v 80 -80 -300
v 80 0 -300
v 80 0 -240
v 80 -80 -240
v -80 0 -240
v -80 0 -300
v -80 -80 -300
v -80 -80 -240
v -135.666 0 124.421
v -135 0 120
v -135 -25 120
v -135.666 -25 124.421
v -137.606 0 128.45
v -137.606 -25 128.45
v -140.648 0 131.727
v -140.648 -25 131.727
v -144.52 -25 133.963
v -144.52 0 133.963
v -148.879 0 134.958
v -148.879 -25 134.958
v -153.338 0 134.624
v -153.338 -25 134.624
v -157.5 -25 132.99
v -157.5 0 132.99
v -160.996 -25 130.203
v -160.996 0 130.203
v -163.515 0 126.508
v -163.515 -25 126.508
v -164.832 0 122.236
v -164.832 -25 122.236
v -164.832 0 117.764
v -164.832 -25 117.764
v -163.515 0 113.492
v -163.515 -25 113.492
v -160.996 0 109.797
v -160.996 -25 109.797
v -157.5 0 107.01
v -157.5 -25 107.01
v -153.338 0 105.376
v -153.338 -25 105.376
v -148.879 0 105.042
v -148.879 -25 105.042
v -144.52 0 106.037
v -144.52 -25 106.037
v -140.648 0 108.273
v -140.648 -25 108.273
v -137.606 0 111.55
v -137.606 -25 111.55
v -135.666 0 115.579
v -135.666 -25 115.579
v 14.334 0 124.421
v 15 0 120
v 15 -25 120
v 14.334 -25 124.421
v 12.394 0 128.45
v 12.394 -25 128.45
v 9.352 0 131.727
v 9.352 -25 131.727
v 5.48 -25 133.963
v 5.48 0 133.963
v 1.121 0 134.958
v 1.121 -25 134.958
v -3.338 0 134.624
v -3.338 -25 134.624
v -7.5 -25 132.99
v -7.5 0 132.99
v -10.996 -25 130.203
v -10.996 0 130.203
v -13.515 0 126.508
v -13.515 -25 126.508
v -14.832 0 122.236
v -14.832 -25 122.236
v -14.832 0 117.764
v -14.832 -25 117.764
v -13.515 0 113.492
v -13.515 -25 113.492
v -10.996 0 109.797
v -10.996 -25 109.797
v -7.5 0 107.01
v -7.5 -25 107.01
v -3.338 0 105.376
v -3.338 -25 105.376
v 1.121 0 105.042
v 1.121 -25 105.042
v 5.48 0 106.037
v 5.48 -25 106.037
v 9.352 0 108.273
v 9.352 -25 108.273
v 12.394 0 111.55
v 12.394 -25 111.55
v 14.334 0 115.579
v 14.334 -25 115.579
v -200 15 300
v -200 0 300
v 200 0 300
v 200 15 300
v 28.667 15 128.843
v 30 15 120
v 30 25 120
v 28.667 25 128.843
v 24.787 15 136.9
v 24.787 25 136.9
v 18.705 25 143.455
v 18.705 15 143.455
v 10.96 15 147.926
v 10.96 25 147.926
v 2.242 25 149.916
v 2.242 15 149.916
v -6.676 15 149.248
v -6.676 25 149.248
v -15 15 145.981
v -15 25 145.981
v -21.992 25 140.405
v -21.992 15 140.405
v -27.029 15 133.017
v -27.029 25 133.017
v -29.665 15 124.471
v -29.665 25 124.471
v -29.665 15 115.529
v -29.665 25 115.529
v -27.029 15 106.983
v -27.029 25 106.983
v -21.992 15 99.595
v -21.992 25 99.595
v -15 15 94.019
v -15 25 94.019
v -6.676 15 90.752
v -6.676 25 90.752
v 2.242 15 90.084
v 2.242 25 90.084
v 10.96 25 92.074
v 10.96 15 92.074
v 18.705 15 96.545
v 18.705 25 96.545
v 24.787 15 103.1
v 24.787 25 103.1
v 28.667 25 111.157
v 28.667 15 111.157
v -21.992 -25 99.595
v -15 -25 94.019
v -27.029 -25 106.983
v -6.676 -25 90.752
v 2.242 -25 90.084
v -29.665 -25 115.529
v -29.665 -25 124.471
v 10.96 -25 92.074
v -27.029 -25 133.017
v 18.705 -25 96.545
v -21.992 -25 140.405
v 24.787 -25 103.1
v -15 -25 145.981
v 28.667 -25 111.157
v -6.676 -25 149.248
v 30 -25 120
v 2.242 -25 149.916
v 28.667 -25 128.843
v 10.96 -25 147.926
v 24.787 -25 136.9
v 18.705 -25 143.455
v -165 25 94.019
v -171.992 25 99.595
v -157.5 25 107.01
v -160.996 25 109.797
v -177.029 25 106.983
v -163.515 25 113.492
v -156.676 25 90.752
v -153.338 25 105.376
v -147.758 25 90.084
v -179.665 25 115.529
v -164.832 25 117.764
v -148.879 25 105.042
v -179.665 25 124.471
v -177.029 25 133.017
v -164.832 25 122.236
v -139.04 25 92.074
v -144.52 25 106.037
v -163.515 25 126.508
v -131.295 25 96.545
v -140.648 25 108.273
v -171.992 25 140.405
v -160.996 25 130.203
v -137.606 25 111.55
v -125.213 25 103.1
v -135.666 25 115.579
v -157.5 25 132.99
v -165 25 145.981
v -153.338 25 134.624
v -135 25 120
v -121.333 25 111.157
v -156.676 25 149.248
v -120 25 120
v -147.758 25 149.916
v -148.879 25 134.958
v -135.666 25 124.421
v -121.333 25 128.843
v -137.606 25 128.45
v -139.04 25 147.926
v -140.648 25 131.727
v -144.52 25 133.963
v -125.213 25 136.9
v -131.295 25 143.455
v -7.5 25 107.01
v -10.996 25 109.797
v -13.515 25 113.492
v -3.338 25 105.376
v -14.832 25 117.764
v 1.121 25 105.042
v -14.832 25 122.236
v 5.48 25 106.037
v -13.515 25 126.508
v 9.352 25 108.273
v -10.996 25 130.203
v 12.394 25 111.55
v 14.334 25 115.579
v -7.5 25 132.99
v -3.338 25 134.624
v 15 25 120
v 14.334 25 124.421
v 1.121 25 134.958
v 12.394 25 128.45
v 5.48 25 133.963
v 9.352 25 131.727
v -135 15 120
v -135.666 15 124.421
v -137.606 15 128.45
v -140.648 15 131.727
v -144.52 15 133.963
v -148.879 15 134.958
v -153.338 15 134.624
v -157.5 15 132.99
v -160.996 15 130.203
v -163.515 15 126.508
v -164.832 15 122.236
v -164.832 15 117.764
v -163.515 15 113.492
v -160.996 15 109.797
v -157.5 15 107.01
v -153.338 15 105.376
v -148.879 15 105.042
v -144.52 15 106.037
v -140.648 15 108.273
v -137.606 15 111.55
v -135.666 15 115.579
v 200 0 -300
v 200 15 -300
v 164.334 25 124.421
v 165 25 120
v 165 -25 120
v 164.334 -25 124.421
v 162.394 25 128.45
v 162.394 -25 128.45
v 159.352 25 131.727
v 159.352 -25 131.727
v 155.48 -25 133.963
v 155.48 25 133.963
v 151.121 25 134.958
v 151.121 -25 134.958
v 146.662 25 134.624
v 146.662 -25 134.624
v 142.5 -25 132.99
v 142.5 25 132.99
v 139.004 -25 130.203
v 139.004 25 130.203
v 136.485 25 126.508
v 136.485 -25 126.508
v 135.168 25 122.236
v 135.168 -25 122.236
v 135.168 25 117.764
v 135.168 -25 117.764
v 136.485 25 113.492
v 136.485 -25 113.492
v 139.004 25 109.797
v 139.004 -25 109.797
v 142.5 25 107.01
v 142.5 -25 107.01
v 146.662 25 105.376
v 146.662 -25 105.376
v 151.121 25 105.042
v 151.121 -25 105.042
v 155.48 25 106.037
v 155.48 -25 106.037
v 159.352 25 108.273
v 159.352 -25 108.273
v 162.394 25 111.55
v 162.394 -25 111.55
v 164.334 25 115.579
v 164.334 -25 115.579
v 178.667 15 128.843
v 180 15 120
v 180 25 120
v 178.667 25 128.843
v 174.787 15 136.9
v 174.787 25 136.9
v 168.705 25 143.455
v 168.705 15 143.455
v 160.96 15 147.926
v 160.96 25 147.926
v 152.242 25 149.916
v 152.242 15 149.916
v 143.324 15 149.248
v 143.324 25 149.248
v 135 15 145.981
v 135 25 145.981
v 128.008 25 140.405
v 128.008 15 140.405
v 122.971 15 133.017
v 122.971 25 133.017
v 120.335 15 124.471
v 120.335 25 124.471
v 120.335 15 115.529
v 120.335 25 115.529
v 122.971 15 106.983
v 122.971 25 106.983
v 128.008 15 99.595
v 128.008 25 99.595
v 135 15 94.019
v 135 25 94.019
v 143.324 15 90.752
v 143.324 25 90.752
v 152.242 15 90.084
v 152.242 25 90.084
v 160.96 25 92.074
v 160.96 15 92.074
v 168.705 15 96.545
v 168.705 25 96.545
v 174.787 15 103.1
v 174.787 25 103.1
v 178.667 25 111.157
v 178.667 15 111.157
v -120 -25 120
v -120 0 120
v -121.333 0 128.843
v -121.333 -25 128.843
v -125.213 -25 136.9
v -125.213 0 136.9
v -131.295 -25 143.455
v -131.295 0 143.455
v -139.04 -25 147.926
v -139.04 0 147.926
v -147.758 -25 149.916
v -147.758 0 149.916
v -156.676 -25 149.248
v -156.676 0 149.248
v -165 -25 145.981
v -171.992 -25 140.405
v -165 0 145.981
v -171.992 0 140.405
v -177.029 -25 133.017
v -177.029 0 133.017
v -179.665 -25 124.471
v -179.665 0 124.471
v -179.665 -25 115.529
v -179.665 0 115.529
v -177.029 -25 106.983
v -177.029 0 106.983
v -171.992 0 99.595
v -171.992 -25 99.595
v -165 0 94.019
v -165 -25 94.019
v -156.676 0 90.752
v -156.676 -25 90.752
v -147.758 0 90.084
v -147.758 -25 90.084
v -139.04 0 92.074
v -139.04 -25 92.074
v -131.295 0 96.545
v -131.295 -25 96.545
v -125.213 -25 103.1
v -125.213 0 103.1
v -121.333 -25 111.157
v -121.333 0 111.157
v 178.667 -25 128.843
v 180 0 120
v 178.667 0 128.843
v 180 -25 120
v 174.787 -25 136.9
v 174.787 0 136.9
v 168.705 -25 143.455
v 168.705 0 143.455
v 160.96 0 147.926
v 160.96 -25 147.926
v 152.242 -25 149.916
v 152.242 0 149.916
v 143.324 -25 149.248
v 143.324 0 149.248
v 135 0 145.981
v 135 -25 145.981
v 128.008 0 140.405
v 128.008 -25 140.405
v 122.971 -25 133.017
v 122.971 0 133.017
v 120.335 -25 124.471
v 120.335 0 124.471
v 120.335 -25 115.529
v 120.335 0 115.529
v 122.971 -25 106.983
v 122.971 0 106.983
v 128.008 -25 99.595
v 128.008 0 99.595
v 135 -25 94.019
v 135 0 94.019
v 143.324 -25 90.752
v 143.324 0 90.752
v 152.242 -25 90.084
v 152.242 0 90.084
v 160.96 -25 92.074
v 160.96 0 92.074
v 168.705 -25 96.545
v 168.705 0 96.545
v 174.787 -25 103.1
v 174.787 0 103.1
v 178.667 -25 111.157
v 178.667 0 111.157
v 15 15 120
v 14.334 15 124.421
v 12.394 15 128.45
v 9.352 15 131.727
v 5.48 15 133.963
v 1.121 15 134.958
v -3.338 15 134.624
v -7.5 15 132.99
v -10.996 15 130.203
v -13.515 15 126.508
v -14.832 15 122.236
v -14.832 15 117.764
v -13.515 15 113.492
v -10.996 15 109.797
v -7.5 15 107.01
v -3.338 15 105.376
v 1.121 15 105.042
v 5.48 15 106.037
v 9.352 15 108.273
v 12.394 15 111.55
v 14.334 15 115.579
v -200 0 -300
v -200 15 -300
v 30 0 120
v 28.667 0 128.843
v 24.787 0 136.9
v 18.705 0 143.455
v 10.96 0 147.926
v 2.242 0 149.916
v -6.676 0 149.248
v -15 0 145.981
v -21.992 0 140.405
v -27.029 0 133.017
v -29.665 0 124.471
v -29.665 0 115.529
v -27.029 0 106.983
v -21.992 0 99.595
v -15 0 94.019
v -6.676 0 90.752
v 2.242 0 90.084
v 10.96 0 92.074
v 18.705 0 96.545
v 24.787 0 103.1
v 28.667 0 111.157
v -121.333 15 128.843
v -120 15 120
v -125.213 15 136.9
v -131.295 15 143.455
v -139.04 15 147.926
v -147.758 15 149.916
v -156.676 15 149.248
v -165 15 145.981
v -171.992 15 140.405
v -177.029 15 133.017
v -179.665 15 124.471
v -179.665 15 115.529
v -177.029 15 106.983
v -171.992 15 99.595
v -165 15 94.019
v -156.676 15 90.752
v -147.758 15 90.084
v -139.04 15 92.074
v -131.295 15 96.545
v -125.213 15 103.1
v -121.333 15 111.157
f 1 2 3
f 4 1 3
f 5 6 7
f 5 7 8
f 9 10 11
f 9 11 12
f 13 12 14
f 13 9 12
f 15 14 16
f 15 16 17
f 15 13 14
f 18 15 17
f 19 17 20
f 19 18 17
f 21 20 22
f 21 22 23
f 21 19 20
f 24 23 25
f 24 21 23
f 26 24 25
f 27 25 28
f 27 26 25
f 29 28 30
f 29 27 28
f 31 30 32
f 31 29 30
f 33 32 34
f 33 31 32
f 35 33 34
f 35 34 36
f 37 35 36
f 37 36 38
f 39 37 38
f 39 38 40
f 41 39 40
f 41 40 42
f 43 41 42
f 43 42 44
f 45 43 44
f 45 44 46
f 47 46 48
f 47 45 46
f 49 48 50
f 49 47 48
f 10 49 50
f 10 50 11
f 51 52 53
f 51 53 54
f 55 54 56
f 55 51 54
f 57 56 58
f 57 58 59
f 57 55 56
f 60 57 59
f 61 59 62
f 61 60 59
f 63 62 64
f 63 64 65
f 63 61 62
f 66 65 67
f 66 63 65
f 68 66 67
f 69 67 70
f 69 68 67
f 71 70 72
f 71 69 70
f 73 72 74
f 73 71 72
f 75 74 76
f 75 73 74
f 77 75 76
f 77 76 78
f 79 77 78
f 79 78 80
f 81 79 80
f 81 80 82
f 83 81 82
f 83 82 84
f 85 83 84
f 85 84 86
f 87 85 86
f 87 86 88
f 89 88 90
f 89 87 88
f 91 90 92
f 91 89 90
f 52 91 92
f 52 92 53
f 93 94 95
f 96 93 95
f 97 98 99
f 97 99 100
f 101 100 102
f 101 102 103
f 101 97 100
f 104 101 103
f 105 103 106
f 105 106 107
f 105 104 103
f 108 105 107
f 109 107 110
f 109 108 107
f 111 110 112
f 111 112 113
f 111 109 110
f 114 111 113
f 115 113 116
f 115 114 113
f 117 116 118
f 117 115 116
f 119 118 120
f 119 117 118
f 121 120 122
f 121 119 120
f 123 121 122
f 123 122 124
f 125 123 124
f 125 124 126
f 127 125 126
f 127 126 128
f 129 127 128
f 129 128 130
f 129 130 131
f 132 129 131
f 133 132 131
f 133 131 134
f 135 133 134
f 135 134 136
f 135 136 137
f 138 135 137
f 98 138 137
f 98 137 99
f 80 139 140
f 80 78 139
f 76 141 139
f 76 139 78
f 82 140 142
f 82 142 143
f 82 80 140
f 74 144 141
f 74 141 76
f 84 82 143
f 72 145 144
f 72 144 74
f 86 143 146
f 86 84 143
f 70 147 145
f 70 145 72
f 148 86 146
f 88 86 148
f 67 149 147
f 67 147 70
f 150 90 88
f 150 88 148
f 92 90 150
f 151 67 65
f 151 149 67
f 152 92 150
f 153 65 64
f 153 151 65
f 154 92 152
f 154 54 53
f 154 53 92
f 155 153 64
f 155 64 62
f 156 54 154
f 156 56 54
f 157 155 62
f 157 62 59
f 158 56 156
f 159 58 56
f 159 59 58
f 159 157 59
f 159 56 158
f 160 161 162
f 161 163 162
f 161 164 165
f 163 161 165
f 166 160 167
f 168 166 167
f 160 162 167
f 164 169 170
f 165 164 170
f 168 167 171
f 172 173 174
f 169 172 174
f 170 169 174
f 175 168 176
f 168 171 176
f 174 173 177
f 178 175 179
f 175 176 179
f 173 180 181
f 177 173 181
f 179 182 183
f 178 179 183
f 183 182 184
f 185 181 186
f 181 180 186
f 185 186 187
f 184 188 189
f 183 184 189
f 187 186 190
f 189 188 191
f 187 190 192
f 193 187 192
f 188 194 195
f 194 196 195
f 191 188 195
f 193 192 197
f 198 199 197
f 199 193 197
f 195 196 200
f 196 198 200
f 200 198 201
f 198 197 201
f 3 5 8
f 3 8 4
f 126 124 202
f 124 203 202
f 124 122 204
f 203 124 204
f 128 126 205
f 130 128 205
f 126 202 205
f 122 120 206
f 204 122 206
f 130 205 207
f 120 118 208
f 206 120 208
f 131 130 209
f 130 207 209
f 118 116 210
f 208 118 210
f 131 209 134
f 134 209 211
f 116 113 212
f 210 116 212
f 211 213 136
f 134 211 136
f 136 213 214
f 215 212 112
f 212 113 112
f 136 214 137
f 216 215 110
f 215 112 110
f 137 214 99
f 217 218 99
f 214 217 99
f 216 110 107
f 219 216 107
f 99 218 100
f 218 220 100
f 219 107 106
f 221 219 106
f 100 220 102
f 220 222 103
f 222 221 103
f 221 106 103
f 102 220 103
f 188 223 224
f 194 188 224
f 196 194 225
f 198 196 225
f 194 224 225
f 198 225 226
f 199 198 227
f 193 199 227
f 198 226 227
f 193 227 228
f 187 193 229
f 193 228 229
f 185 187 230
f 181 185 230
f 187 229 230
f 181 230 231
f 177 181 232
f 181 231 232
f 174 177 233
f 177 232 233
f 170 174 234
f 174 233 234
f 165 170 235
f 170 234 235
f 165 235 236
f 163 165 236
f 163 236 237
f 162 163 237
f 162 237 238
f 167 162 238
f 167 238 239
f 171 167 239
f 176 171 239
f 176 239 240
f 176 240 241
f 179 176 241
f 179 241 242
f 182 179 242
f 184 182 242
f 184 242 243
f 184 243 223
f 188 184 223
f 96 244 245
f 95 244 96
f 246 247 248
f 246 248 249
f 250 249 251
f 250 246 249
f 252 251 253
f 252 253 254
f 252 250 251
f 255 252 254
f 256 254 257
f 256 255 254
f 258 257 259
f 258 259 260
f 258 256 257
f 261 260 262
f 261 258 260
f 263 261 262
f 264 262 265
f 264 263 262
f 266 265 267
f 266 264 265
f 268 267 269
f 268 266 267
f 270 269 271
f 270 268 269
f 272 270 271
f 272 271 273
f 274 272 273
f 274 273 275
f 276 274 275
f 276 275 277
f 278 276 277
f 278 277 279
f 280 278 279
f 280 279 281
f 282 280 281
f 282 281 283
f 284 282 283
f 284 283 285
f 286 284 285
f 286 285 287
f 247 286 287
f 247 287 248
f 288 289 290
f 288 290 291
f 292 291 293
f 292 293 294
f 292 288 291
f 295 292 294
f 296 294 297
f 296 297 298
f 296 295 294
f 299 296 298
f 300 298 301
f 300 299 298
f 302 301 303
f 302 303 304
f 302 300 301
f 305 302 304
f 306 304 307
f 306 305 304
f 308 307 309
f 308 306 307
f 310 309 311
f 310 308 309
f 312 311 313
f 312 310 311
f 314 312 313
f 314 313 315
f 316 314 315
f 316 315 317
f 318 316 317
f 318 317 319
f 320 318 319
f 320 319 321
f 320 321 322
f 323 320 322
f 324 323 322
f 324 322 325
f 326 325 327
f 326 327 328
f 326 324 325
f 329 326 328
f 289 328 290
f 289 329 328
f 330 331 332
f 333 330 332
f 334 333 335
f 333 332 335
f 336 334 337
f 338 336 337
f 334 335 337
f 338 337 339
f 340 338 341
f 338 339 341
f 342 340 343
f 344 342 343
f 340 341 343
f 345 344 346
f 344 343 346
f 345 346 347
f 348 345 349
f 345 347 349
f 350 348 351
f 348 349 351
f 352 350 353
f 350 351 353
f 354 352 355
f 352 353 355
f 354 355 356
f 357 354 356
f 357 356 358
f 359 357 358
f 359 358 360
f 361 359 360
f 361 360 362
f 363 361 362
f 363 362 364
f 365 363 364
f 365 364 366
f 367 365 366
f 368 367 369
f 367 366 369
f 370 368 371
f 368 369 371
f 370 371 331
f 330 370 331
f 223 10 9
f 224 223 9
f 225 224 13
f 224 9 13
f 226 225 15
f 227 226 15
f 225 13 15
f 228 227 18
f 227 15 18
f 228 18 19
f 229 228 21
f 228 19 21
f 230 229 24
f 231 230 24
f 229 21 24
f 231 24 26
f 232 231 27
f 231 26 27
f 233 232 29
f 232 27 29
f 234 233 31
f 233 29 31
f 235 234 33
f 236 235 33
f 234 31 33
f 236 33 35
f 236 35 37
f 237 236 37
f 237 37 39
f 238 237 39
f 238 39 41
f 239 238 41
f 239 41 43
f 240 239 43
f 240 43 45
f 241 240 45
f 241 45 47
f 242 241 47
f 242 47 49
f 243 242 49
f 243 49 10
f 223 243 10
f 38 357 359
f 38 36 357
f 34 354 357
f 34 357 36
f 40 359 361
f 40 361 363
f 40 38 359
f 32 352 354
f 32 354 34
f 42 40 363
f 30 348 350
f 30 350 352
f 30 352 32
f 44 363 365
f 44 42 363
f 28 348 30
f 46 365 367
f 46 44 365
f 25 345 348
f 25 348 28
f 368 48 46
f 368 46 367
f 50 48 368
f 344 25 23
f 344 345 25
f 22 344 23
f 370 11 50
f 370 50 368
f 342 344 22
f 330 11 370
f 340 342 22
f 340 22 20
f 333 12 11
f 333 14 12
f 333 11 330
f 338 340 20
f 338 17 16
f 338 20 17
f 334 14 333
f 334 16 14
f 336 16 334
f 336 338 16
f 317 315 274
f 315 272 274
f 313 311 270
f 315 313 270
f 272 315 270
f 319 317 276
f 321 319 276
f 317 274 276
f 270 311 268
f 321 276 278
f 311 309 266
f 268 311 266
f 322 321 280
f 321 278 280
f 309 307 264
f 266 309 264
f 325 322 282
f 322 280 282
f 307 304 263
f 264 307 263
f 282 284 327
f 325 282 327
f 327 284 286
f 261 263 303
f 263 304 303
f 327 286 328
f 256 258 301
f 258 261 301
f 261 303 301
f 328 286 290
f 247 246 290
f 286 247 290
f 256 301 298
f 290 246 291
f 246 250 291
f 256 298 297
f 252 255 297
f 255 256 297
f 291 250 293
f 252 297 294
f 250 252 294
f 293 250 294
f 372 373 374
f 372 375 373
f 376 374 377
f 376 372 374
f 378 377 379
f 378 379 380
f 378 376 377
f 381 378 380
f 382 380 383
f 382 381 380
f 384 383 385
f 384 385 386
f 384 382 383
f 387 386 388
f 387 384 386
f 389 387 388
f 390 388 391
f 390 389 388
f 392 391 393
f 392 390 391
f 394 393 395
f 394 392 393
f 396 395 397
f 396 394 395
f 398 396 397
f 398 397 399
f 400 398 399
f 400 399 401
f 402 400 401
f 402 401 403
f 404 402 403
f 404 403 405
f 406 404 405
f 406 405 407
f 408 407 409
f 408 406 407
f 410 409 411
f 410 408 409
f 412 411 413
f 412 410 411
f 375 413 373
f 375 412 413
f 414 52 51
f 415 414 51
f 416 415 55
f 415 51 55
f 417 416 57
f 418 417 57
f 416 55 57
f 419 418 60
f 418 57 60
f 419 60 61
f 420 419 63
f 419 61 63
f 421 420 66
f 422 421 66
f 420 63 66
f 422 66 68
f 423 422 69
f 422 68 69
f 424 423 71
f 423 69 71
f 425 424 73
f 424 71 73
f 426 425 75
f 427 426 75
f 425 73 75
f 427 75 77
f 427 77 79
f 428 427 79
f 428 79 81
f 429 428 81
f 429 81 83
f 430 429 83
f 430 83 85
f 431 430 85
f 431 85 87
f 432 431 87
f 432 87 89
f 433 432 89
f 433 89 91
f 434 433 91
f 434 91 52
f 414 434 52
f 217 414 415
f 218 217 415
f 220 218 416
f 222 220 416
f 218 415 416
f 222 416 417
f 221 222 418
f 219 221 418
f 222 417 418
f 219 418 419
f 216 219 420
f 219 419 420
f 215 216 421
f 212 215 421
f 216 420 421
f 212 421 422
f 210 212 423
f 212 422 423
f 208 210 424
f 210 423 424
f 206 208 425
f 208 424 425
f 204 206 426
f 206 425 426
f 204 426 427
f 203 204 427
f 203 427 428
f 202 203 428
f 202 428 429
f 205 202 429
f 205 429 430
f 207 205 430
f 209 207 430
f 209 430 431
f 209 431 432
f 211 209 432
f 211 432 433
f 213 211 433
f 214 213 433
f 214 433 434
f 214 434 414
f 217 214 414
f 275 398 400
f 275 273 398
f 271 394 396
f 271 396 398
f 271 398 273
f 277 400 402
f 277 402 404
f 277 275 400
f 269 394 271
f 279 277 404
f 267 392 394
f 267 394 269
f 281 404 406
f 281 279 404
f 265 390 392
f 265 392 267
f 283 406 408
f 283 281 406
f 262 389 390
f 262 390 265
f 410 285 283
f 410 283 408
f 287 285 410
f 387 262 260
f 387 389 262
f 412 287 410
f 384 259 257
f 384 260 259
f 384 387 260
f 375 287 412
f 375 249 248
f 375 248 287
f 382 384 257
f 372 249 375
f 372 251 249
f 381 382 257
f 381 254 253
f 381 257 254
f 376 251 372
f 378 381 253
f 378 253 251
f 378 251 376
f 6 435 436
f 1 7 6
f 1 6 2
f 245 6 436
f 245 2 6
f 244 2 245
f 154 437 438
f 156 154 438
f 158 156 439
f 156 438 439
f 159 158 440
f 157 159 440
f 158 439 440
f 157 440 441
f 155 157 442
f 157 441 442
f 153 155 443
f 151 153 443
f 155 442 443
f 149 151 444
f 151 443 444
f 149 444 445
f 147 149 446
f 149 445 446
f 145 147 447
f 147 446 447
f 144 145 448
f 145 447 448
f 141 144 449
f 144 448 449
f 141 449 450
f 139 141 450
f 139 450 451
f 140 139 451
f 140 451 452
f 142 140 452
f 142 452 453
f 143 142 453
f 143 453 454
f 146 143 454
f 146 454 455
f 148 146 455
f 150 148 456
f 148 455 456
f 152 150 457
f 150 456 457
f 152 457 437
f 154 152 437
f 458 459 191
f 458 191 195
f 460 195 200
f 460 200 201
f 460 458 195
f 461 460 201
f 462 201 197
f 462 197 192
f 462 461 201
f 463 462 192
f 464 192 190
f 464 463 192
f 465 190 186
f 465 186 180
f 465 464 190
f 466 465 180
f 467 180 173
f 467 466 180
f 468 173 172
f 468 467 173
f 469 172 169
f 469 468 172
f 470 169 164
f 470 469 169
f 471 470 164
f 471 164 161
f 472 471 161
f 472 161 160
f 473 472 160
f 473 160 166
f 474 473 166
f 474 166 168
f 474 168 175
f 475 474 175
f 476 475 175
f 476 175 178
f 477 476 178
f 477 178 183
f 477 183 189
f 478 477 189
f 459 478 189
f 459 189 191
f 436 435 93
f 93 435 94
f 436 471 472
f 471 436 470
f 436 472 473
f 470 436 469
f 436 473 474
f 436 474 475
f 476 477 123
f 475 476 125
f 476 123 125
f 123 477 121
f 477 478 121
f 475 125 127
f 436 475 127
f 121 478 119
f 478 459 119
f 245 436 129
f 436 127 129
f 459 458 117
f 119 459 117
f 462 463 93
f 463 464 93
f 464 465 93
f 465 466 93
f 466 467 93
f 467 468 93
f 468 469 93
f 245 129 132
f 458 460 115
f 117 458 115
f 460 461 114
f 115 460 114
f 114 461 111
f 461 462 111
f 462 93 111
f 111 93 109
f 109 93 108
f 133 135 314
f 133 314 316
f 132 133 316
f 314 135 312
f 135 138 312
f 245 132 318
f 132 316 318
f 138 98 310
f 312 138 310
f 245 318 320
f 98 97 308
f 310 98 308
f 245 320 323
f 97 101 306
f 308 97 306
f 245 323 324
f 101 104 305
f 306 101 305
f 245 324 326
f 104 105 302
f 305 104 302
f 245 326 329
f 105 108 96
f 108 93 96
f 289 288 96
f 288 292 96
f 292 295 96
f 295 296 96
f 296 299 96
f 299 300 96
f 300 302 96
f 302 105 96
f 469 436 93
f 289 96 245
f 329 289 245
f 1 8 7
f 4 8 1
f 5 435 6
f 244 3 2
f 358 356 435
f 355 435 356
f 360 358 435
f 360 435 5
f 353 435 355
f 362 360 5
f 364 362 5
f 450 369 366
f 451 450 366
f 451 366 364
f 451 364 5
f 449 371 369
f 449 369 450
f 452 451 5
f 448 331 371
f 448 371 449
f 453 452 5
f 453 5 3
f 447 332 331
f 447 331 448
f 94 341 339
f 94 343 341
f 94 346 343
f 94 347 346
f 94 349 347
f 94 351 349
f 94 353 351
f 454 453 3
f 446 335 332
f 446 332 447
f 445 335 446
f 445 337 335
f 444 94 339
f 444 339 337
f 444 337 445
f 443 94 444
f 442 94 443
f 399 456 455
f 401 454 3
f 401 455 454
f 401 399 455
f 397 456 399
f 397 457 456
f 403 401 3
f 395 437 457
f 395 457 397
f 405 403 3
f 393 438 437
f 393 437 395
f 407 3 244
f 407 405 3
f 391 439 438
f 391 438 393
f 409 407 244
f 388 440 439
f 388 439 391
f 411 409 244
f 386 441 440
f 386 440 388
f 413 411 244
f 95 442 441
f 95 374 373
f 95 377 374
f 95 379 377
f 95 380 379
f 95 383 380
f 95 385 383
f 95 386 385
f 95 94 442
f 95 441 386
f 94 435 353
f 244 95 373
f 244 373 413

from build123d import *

# Parameters (mm, degrees)
F0_W     = 400
F0_H     = 600
F1_DEPTH = 15
F2_R     = 30
F2_R_2   = 15
F3_DEPTH = 25
F4_DEPTH = 25.001
F5_W     = 160
F5_H     = 60
F6_DEPTH = 80


with BuildPart() as f1:
    # F0 (on Front) → F1 (new body)
    with BuildSketch(Plane.XZ):
        Rectangle(F0_W, F0_H)
    extrude(amount=-F1_DEPTH)

    # F2 (on face) → F3 (join, symmetric)
    with BuildSketch(Plane.XZ):
        with Locations((-150, 120)):
            Circle(F2_R)
        with Locations((-150, 120)):
            Circle(F2_R_2, mode=Mode.SUBTRACT)
        with Locations((0, 120)):
            Circle(F2_R)
        with Locations((0, 120)):
            Circle(F2_R_2, mode=Mode.SUBTRACT)
        with Locations((150, 120)):
            Circle(F2_R)
        with Locations((150, 120)):
            Circle(F2_R_2, mode=Mode.SUBTRACT)
    extrude(amount=F3_DEPTH, both=True)

    # F4 (cut, through all): faces of the model
    f4_faces = [f1.faces().sort_by_distance(p)[0] for p in [
        (150, 0, 120),
        (0, 0, 120),
        (-150, 0, 120),
    ]]
    extrude(f4_faces, amount=-F4_DEPTH, mode=Mode.SUBTRACT)

    # F5 (on face) → F6 (join)
    with BuildSketch(Plane.XZ):
        with Locations((0, -270)):
            Rectangle(F5_W, F5_H)
    extrude(amount=F6_DEPTH)


solid = f1.part
